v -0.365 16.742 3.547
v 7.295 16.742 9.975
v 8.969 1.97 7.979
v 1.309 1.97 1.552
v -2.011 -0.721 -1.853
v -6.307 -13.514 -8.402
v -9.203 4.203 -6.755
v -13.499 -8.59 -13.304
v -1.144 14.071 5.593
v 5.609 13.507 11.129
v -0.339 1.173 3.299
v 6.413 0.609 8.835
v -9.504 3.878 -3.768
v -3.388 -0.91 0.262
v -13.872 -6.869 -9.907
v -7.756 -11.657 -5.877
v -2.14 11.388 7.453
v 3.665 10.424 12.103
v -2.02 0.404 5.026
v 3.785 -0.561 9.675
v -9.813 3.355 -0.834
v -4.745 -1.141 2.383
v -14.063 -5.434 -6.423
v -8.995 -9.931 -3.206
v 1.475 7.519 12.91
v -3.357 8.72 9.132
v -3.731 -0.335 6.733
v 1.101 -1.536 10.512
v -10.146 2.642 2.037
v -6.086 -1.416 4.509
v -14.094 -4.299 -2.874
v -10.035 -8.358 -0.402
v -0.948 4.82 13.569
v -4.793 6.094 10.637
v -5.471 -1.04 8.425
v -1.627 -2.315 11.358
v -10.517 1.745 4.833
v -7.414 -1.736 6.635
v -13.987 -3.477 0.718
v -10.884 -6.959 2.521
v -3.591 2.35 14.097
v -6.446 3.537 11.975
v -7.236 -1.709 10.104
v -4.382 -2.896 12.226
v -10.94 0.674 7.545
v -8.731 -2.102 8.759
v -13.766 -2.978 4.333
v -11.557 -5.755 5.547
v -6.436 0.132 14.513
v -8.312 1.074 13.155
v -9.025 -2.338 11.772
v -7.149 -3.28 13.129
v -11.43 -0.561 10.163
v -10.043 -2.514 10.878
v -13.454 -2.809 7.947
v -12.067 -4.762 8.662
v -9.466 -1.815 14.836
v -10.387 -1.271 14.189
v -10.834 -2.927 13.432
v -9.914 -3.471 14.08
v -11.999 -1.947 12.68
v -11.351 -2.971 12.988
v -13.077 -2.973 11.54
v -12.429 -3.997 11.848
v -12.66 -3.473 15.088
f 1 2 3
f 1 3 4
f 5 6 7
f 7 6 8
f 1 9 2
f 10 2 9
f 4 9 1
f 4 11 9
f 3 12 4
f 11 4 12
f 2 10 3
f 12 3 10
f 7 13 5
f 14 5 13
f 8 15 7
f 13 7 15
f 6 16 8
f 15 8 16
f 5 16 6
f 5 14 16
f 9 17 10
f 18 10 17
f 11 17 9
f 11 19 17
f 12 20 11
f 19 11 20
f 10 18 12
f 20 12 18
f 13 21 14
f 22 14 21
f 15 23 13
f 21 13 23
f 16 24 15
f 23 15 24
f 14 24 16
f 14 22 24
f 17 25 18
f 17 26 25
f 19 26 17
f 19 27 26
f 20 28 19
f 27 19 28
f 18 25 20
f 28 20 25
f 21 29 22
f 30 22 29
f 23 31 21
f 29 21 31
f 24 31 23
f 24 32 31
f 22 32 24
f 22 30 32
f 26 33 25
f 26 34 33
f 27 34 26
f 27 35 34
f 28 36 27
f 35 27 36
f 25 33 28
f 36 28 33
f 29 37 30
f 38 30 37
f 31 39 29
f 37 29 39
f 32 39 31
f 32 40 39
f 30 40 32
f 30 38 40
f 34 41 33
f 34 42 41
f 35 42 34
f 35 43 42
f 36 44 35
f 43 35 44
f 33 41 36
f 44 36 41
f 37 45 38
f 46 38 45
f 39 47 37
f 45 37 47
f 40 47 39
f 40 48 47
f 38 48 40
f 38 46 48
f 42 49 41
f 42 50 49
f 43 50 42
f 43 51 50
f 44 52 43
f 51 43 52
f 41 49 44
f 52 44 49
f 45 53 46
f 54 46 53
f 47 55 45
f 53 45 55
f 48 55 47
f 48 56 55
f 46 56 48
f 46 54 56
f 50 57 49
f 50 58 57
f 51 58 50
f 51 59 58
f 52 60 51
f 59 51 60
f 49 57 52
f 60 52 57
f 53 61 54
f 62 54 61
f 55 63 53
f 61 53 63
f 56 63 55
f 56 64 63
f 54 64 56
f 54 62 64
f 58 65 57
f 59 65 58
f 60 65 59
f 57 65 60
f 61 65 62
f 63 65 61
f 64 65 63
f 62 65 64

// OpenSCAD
rotate([10, -40, 0])
linear_extrude(height=20, scale=0, twist=30, slices=8) {
    translate([2,2,0]) square([10, 15]);
    rotate([0,0,150])
       translate([2,2,0]) square([10, 15]);
}
